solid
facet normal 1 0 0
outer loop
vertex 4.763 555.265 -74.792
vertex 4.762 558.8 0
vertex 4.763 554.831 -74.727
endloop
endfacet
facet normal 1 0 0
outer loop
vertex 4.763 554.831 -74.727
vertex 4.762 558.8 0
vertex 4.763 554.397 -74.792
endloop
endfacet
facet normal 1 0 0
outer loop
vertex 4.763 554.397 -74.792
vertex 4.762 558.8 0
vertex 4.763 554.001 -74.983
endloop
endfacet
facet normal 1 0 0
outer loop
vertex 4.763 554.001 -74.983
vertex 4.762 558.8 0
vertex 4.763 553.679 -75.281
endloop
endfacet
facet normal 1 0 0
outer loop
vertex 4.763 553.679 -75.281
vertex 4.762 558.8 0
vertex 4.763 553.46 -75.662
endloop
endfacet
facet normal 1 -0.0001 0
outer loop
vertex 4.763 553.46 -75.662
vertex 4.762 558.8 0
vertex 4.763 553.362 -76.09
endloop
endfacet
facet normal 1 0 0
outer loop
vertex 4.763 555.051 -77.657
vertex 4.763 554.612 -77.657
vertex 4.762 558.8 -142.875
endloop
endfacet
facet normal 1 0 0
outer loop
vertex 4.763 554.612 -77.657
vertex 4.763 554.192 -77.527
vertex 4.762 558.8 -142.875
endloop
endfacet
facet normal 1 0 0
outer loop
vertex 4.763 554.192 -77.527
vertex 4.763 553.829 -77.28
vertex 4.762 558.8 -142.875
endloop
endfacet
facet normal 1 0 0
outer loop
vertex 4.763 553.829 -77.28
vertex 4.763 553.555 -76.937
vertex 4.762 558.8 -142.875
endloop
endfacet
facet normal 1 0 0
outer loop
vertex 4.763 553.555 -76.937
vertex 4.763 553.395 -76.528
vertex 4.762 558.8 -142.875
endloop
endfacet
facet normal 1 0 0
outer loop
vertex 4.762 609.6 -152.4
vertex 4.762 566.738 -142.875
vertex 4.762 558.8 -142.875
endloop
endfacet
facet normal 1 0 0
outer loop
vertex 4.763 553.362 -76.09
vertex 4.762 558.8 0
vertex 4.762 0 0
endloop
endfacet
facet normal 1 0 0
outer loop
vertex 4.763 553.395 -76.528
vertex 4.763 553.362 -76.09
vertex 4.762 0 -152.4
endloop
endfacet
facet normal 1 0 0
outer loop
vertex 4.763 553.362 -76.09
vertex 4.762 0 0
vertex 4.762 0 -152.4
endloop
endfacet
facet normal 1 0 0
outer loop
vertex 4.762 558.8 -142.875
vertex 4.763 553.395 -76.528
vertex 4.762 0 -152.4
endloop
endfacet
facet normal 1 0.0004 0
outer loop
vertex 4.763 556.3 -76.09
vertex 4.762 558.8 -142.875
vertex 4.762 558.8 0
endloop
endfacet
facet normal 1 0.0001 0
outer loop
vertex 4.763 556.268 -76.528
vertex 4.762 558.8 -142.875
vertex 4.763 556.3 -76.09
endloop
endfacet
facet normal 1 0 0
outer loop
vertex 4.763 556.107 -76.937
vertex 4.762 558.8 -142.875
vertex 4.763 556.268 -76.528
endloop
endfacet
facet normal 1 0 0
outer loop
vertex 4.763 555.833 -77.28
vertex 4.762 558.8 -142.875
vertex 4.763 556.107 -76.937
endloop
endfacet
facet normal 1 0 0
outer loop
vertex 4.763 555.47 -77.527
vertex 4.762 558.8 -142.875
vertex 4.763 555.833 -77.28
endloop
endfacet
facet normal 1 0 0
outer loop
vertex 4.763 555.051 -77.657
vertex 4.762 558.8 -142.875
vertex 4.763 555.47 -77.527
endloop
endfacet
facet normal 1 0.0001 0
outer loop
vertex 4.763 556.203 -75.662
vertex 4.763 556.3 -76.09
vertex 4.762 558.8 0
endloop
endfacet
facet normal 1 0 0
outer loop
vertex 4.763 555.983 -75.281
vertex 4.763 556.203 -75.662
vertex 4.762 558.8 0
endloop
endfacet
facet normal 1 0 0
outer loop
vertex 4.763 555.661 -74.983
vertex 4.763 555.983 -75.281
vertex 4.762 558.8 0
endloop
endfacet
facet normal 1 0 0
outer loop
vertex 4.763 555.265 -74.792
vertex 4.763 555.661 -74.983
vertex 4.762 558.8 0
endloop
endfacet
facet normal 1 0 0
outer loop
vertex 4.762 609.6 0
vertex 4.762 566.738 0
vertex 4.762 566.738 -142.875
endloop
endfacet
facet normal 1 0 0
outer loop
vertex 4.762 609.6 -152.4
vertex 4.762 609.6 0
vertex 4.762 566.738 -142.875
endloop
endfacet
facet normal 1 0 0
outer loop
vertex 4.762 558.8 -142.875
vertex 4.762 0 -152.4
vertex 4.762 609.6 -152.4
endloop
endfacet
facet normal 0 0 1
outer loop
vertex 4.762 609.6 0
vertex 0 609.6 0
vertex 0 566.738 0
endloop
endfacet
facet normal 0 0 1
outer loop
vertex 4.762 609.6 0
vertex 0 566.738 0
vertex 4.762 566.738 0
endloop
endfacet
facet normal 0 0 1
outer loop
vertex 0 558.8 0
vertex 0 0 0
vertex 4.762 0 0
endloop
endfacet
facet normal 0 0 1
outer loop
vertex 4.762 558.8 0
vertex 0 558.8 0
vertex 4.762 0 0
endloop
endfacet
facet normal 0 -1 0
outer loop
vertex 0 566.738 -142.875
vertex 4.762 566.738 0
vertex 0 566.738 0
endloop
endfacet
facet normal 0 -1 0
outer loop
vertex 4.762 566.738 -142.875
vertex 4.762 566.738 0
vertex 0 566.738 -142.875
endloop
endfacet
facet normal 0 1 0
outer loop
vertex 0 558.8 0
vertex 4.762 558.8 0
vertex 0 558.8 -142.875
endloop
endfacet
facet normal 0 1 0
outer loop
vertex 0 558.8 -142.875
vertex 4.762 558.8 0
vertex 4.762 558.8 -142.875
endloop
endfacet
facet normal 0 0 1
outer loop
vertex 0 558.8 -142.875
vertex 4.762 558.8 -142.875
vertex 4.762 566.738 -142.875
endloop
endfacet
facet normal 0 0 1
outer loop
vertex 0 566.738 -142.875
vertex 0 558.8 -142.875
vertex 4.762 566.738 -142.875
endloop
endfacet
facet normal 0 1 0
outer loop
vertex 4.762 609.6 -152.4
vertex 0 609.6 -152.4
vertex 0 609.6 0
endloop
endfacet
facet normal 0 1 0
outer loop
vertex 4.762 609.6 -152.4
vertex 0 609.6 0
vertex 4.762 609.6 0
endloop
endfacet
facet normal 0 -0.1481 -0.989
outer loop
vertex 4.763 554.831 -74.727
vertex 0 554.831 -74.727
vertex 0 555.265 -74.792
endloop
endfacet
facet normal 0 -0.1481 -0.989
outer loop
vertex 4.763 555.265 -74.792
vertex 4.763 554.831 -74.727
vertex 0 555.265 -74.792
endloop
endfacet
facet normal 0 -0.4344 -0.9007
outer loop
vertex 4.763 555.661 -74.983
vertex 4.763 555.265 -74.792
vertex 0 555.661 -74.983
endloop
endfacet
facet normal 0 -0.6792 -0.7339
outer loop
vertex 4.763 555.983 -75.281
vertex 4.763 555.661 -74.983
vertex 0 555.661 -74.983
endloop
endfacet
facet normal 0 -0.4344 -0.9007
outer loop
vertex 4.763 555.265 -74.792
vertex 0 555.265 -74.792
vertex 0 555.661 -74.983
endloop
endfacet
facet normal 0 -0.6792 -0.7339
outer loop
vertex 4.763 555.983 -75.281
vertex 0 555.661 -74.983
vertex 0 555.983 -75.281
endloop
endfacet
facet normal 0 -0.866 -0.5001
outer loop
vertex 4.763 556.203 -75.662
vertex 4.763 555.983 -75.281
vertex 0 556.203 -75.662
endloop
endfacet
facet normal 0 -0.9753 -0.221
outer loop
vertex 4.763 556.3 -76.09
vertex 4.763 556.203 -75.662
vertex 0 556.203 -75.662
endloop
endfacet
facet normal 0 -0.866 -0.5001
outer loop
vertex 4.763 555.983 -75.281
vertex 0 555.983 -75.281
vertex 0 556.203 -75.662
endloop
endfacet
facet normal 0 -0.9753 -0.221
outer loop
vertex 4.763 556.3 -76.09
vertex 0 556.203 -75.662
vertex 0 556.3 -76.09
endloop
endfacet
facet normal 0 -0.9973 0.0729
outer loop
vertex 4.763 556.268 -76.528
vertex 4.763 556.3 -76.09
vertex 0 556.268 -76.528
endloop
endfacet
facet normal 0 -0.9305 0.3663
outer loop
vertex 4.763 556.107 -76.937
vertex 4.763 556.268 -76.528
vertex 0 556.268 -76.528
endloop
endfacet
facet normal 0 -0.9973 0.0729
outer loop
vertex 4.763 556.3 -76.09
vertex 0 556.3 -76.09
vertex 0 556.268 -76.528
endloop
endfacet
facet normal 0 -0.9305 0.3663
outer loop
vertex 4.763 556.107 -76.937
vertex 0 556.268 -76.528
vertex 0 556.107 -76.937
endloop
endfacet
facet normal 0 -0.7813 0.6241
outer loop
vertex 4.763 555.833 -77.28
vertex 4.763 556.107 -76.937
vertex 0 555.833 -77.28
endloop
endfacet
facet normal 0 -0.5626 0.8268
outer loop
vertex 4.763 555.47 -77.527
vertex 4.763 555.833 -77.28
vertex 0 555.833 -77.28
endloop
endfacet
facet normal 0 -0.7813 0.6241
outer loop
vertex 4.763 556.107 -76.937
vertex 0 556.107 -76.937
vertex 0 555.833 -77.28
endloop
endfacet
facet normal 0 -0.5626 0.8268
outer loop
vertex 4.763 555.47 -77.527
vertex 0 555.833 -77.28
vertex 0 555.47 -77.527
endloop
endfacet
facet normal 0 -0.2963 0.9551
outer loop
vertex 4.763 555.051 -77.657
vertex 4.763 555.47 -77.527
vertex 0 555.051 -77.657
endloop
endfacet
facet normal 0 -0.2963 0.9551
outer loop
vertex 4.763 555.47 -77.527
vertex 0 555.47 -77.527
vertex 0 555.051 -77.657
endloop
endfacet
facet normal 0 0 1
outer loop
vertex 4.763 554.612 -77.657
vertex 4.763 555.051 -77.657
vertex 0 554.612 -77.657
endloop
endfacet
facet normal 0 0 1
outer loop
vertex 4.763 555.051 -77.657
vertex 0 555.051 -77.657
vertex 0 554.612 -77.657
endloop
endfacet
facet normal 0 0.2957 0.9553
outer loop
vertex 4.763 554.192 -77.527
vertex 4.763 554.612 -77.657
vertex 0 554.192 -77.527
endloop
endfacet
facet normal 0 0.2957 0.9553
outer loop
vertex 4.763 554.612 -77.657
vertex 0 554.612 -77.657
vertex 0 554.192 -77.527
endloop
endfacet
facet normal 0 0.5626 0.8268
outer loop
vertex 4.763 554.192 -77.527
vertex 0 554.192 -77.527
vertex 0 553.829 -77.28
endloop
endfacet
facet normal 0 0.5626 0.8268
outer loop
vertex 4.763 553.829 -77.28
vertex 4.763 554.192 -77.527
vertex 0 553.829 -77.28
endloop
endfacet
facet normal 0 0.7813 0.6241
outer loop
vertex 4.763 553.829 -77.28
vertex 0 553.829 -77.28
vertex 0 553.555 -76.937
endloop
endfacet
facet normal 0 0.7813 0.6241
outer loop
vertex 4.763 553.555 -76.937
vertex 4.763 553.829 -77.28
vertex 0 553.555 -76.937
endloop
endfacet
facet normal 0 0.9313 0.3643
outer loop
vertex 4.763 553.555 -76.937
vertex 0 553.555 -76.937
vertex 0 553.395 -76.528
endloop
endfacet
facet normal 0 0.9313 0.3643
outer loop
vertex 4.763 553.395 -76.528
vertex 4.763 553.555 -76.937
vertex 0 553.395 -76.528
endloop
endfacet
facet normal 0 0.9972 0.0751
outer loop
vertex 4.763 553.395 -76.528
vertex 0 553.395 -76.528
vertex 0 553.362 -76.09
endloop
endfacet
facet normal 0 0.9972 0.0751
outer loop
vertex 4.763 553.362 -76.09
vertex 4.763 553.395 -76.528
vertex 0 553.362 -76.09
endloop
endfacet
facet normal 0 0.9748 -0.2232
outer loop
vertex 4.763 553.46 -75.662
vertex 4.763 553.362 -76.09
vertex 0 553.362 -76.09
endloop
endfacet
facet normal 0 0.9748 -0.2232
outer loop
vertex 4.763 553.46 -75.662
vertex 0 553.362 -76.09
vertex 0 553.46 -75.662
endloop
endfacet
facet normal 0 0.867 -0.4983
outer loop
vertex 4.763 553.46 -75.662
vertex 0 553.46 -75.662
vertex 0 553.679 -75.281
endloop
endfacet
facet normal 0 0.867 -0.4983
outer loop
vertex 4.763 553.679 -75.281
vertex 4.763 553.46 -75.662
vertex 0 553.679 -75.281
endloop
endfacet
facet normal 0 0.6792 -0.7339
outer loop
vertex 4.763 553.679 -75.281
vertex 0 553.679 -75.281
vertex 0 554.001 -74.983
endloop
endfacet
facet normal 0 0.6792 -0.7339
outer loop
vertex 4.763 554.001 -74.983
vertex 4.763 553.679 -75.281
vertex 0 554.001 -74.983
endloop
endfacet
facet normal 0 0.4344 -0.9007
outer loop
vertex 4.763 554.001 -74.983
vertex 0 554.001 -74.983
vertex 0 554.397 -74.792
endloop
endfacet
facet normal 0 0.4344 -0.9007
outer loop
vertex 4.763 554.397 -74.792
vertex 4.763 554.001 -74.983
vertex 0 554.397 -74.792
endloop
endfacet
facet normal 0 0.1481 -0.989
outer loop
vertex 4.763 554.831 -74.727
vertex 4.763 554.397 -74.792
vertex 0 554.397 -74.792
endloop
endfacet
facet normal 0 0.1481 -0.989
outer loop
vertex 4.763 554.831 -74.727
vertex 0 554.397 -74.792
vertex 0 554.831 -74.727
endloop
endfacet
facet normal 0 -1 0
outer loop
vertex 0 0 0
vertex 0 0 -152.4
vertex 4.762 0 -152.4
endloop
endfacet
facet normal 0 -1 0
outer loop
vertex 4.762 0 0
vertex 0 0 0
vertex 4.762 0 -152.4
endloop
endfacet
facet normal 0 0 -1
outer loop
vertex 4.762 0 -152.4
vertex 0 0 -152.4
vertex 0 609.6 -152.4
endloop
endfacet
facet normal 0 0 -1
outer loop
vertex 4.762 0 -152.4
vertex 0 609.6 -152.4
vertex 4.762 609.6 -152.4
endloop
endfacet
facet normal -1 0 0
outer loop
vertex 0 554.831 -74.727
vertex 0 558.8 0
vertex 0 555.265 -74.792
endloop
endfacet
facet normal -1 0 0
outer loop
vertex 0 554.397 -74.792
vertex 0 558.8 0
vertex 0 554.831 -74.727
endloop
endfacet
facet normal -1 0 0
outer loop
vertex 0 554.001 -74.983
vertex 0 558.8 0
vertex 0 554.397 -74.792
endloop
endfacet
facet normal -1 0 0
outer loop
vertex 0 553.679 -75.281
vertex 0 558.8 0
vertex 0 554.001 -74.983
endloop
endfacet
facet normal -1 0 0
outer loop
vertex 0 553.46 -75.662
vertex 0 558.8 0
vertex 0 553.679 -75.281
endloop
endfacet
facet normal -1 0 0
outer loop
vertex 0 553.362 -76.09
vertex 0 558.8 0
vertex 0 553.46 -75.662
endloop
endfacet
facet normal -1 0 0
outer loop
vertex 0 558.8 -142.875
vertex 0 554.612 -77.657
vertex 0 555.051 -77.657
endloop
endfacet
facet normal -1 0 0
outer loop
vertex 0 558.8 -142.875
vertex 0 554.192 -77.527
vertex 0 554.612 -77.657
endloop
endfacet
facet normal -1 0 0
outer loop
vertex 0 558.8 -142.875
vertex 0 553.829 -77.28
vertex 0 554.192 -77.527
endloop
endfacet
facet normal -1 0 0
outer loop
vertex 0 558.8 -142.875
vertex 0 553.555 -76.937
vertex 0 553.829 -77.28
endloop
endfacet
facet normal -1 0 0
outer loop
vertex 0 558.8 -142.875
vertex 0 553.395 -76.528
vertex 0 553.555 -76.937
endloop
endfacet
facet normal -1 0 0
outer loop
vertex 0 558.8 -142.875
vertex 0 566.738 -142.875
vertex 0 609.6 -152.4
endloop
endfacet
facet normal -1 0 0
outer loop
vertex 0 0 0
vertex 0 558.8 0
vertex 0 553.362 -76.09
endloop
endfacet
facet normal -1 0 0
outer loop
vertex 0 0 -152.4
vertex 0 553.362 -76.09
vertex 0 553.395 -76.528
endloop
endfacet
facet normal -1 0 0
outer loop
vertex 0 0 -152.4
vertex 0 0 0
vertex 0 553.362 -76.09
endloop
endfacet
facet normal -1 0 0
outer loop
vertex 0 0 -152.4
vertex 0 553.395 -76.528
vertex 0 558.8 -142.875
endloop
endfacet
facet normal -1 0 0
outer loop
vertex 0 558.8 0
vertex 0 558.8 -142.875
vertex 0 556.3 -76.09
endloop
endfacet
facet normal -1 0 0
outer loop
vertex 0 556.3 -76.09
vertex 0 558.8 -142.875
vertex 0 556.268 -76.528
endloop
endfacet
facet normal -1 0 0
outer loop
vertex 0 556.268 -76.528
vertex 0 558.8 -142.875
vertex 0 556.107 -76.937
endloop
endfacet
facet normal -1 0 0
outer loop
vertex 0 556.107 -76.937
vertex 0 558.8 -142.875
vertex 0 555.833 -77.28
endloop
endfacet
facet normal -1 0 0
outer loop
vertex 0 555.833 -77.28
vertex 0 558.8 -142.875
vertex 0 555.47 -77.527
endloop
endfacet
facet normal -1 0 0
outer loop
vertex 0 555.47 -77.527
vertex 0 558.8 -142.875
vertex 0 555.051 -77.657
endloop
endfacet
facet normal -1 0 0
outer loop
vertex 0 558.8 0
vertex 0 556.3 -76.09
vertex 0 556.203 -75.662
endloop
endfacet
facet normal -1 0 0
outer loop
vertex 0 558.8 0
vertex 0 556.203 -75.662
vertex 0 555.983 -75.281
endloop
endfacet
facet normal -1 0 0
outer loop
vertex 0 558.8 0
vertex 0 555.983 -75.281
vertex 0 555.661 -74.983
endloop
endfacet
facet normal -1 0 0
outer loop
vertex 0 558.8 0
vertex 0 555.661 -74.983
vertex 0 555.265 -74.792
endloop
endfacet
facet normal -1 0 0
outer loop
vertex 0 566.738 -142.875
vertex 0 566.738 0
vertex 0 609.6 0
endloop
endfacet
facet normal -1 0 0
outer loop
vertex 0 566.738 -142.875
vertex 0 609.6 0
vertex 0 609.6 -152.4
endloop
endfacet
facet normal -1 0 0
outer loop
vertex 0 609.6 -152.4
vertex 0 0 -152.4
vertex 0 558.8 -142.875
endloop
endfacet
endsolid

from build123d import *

# Parameters (mm, degrees)
SKETCH1_W             = 4.7625
SKETCH1_H             = 152.4
BOSS_EXTRUDE1_DEPTH   = 609.6
SKETCH2_W             = 142.875
SKETCH2_H             = 7.9375
CUT_EXTRUDE1_DEPTH    = 629.379345146
F_4_CLEARANCE_HOLE1_D = 2.9464


with BuildPart() as part:
    # Sketch1 → Boss-Extrude1 (new body)
    with BuildSketch(Plane(origin=(0, 0, 0), x_dir=(1, 0, 0), z_dir=(0, 1, 0))):
        with Locations((2.38125, 76.2)):
            Rectangle(SKETCH1_W, SKETCH1_H)
    extrude(amount=BOSS_EXTRUDE1_DEPTH)

    # Sketch2 → Cut-Extrude1 (cut, through all)
    with BuildSketch(Plane(origin=(4.7625, 0, 0), x_dir=(0, 0, -1), z_dir=(1, 0, 0))):
        with Locations((71.4375, 562.76875)):
            Rectangle(SKETCH2_W, SKETCH2_H)
    extrude(amount=-CUT_EXTRUDE1_DEPTH, mode=Mode.SUBTRACT)

    # #4 Clearance Hole1 (through all)
    with Locations(Plane(origin=(4.7625, 0, 0), x_dir=(0, 0, -1), z_dir=(1, 0, 0))):
        with Locations((76.2, 554.83125)):
            Hole(F_4_CLEARANCE_HOLE1_D / 2)


solid = part.part
